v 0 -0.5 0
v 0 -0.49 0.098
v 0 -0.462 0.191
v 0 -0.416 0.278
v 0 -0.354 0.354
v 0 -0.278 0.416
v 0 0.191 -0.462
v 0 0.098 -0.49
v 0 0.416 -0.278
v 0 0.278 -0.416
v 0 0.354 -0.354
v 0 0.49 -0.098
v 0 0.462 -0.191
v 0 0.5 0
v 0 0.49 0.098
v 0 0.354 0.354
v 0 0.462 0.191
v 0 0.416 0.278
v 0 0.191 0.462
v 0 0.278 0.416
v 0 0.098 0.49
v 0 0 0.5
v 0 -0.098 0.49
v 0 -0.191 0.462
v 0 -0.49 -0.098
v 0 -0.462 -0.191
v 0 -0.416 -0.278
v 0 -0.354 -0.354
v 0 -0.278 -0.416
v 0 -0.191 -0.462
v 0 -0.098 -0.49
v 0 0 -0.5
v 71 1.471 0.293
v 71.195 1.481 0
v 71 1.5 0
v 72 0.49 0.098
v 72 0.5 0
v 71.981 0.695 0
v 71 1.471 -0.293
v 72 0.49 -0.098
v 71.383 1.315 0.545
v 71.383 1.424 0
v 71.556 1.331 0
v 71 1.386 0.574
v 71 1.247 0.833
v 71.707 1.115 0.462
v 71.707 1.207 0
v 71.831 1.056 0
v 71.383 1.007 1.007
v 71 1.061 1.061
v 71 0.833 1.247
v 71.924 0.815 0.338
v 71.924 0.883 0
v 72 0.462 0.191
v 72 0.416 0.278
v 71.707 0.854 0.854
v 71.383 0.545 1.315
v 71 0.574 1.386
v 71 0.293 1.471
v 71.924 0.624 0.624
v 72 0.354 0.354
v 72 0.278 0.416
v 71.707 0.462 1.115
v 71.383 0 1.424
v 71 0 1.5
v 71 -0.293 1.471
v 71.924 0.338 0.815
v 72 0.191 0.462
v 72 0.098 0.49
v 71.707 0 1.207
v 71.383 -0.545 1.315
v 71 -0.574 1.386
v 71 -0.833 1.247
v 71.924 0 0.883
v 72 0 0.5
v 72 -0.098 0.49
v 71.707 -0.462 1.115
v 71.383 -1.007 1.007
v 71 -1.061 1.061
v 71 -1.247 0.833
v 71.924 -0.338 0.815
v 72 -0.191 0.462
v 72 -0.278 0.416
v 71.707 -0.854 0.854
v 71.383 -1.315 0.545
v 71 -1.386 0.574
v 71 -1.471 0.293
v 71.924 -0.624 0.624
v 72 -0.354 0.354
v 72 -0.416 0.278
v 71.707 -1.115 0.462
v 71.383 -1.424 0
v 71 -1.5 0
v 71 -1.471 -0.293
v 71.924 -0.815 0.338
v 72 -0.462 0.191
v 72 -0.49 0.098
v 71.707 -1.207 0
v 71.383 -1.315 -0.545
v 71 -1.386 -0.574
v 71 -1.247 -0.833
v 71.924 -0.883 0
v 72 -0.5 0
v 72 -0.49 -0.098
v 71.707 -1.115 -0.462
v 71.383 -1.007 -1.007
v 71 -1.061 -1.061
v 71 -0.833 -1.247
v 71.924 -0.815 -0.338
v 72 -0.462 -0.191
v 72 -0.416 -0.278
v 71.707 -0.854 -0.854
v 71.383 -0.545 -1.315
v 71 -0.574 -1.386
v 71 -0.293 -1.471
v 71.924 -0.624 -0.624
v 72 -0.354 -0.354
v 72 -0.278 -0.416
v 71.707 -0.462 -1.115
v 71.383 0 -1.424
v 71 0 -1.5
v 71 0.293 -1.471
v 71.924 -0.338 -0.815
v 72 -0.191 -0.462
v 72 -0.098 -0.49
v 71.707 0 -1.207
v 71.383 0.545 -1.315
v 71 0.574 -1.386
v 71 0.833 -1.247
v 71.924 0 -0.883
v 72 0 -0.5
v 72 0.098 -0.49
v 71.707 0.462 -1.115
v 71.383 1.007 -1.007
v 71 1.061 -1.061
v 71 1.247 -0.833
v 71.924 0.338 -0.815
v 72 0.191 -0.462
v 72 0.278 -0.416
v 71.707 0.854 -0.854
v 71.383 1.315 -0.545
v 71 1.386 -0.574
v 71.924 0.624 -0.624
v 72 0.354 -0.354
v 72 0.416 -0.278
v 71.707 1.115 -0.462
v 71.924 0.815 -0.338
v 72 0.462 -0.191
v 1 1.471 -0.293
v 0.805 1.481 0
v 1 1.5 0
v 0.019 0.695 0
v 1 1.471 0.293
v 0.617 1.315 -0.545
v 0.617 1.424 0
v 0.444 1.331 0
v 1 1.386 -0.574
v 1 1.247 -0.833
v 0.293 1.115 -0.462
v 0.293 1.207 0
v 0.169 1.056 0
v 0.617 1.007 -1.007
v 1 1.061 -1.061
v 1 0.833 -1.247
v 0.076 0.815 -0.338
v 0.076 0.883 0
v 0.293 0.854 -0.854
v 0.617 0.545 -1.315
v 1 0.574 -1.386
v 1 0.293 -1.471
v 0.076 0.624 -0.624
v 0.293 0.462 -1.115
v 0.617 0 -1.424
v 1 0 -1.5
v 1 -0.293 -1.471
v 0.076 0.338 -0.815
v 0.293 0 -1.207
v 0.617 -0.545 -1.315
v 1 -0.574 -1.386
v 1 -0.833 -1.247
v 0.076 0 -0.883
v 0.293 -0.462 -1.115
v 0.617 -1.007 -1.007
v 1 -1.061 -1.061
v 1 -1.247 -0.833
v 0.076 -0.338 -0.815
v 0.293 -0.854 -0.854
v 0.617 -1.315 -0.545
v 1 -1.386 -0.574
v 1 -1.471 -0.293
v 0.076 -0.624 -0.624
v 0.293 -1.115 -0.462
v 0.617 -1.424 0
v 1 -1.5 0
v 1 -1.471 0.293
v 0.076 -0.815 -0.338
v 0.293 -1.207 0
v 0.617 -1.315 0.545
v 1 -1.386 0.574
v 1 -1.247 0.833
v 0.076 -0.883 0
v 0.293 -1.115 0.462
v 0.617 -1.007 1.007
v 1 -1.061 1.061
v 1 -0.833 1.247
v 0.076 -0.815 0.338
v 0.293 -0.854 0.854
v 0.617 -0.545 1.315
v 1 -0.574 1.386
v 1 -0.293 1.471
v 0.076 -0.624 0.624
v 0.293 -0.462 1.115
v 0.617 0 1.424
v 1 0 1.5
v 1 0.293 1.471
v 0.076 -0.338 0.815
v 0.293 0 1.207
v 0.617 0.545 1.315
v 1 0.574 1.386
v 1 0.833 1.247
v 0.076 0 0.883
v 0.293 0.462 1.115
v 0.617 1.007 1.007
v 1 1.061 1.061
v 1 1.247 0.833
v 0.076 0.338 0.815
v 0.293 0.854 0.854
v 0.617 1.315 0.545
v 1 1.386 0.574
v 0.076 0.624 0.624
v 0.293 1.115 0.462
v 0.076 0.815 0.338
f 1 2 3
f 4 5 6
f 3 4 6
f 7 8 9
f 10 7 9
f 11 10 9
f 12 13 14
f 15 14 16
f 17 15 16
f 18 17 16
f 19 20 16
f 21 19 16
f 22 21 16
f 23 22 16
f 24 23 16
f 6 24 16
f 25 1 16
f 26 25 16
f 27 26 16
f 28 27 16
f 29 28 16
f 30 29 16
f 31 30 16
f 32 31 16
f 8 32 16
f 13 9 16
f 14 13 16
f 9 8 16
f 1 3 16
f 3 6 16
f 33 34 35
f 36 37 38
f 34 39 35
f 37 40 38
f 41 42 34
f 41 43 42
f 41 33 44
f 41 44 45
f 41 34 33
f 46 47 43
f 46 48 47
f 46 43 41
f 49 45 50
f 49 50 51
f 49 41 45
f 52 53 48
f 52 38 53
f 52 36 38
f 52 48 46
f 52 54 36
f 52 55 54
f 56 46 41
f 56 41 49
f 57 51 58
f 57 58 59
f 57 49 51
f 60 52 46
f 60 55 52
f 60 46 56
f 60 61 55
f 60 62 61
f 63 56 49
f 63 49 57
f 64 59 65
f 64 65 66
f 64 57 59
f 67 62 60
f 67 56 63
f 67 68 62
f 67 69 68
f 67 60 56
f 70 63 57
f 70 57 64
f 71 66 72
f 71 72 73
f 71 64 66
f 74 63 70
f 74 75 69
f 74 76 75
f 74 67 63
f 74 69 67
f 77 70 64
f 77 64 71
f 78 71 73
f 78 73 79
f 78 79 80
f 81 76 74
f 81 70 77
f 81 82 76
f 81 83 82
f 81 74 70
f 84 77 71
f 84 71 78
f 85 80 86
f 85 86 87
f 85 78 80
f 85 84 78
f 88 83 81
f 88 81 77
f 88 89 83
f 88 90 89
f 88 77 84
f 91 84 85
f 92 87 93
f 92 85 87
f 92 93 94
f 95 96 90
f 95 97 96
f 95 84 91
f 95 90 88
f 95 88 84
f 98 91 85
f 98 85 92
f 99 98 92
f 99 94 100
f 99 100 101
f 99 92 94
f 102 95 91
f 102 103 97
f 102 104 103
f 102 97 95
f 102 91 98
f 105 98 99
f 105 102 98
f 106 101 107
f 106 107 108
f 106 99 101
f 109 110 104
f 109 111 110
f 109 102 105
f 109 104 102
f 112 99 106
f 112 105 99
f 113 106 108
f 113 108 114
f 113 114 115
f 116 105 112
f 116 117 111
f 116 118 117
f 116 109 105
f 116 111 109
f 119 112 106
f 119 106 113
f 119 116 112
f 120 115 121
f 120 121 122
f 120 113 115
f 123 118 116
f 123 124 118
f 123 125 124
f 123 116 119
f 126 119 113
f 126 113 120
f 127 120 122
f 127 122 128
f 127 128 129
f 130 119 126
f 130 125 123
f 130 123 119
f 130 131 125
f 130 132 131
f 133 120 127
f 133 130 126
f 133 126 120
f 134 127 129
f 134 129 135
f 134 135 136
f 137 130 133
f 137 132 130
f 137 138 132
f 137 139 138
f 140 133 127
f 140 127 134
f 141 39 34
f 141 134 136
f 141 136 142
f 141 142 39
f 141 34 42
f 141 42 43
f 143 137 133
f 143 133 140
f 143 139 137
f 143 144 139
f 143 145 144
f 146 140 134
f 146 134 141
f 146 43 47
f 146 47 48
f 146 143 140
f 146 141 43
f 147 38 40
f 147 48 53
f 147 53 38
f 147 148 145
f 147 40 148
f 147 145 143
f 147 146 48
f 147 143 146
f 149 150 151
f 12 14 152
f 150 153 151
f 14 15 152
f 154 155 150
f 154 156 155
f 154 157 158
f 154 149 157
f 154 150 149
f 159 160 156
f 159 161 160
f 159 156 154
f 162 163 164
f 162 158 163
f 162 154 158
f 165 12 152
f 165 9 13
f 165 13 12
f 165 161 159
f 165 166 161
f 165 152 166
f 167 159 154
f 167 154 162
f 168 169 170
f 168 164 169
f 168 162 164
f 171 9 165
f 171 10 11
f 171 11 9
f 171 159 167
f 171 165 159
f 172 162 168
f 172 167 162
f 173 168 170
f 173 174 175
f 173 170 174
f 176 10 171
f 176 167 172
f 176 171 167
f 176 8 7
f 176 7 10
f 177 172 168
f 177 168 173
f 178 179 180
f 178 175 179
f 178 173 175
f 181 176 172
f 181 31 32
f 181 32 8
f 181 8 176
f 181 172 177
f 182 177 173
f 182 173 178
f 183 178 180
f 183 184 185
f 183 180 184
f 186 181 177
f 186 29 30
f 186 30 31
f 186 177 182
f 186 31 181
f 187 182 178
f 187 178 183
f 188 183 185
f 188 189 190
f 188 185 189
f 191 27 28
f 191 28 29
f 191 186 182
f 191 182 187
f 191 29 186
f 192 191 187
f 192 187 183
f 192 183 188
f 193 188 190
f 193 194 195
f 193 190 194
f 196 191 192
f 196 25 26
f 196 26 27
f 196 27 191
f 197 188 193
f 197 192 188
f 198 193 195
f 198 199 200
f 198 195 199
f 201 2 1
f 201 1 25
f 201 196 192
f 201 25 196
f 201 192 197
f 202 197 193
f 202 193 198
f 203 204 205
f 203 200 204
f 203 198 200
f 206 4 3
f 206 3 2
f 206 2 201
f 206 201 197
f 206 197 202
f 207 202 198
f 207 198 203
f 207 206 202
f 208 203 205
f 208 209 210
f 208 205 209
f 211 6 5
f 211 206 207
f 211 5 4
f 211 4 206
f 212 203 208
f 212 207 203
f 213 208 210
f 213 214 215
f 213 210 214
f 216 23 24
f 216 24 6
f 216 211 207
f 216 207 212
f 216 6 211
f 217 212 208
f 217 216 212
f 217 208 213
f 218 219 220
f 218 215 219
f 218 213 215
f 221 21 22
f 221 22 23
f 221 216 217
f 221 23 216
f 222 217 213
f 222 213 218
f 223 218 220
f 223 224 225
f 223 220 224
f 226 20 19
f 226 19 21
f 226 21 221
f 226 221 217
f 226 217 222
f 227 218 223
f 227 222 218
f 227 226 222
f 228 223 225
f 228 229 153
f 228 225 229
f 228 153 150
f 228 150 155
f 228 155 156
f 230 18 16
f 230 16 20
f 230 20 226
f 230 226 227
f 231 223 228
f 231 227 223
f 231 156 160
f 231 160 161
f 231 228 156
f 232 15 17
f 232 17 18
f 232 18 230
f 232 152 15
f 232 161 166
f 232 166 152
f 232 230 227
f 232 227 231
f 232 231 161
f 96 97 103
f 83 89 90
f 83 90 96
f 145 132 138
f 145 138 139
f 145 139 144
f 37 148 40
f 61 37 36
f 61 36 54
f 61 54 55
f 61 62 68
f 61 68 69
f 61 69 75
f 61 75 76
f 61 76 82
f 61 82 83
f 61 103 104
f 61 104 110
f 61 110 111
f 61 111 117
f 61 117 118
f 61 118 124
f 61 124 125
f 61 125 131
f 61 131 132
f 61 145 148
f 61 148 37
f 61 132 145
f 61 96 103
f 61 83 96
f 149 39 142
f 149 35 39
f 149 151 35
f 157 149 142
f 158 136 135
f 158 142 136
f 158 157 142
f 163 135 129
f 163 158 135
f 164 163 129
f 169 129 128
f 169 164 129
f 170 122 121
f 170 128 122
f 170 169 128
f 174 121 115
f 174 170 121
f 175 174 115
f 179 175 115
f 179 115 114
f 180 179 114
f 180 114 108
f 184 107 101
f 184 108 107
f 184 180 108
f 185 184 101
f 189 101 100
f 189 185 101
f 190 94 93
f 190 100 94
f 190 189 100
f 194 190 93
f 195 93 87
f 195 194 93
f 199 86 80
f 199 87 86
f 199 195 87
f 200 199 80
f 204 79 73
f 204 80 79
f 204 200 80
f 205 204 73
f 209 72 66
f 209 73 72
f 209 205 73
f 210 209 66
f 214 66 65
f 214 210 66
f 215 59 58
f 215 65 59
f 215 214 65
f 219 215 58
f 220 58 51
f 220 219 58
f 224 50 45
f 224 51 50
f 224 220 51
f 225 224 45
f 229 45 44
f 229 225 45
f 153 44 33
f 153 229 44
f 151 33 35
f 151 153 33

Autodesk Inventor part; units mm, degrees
ref_plane "YZ Plane" through (0, 0, 0) normal (1, 0, 0) x (0, 1, 0)
ref_plane "XZ Plane" through (0, 0, 0) normal (0, 1, 0) x (-1, 0, 0)
ref_plane "XY Plane" through (0, 0, 0) normal (0, 0, 1) x (1, 0, 0)
sketch "Эскиз1" plane through (0, 0, 0) normal (1, 0, 0) x (0, 1, 0)
  circle A0 centre (0, 0) radius 1.5
  dimension "d0" = 3
extrude "Выдавливание1" add sketch "Эскиз1" along normal blind 72
fillet "Сопряжение1" radius 1 1 edges at (72, -1.5, 0)
fillet "Сопряжение2" radius 1 1 edges at (0, -1.5, 0)
properties part number "Шпилька для Лепестков"
